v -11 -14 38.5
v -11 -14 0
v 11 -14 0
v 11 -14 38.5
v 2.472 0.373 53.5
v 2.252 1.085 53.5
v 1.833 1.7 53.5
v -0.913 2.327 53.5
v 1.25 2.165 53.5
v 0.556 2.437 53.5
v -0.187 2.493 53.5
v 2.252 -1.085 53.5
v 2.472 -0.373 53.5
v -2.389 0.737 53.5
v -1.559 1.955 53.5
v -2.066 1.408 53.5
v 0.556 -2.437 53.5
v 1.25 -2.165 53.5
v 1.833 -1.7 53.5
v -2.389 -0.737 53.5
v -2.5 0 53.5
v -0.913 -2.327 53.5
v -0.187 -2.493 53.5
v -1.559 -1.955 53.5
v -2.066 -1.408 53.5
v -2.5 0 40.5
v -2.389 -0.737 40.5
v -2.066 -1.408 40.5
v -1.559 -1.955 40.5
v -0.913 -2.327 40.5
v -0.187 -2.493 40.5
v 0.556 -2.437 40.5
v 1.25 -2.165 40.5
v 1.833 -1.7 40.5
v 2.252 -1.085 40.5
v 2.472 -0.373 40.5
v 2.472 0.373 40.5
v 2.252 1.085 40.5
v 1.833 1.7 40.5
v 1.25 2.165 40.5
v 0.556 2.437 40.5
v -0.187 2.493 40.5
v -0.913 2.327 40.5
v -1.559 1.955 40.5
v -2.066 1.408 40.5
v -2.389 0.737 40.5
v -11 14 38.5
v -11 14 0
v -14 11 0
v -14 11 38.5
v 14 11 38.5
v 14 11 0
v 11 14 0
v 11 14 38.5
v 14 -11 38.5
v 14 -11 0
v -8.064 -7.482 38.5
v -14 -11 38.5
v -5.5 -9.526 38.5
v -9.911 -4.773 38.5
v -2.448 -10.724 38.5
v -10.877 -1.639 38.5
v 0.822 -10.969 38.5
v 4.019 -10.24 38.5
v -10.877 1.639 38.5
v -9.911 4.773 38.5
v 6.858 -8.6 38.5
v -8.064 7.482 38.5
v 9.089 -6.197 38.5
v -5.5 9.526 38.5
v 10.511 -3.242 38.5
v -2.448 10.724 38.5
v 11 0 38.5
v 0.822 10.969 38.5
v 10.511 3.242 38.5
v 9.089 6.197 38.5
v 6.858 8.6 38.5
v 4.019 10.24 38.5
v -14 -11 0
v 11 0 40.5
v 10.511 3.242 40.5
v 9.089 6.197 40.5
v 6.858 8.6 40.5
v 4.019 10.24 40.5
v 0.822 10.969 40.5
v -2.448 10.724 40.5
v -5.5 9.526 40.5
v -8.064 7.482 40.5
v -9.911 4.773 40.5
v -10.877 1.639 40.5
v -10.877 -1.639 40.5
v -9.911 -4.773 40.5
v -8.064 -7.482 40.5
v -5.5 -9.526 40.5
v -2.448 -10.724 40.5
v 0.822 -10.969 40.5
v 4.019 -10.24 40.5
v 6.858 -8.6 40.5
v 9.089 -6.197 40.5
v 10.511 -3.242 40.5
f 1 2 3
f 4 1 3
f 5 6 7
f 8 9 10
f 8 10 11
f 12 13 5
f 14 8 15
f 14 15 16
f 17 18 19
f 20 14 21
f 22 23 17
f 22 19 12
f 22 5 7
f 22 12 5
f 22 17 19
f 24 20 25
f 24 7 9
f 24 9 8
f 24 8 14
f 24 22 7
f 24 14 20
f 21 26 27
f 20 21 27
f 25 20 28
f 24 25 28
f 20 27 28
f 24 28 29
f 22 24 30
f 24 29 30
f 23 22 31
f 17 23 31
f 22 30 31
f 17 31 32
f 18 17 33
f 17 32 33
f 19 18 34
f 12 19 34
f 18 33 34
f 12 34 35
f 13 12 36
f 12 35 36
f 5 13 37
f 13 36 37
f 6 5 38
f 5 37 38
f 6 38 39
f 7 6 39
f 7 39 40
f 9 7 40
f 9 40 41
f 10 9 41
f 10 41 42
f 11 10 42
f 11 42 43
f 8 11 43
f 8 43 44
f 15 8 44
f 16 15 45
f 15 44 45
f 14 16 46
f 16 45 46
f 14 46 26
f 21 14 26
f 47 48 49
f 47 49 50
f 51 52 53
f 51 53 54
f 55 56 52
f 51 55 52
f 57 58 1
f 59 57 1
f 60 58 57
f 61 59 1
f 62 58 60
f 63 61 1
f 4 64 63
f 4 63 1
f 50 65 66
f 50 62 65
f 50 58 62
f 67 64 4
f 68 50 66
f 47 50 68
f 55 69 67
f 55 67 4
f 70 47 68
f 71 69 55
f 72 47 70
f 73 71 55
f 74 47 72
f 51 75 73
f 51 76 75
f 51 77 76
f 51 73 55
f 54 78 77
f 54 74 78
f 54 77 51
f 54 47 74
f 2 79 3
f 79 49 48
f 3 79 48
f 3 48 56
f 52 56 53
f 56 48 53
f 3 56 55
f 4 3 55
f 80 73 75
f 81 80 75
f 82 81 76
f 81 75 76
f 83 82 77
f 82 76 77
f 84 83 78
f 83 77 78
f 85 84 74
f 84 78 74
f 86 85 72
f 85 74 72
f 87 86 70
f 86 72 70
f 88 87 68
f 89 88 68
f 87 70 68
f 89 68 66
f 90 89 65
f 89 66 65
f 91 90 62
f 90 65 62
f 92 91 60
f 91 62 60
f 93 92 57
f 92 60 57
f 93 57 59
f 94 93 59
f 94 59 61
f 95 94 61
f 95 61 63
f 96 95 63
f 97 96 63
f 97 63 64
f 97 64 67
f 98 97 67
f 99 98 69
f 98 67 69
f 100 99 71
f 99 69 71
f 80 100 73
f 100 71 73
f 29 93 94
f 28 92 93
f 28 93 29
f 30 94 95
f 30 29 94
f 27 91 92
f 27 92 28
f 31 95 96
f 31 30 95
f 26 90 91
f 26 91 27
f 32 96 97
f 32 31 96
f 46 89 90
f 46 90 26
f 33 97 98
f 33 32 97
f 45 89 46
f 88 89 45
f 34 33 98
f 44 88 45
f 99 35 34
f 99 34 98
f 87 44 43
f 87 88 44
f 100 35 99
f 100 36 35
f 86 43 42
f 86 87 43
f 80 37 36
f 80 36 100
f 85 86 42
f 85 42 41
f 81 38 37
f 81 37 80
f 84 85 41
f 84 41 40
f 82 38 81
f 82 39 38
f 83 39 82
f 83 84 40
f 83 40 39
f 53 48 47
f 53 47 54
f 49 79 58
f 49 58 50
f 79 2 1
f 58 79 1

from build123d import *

# Parameters (mm, degrees)
SKETCH_1_W      = 28
SKETCH_1_H      = 28
EXTRUDE_1_DEPTH = 38.5
SKETCH_2_R      = 11
EXTRUDE_2_DEPTH = 2
SKETCH_3_R      = 2.5
EXTRUDE_3_DEPTH = 13
CHAMFER_1_SIZE  = 3


with BuildPart() as part:
    # 草图1 → 凸台-拉伸1 (new body)
    with BuildSketch(Plane.XY):
        Rectangle(SKETCH_1_W, SKETCH_1_H)
    extrude(amount=EXTRUDE_1_DEPTH)

    # 草图2 → 凸台-拉伸2 (add)
    with BuildSketch(Plane.XY.offset(38.5)):
        Circle(SKETCH_2_R)
    extrude(amount=EXTRUDE_2_DEPTH)

    # 草图3 → 凸台-拉伸3 (add)
    with BuildSketch(Plane.XY.offset(40.5)):
        with Locations(Location((0, 0, 0), (0, 0, 180))):
            Circle(SKETCH_3_R)
    extrude(amount=EXTRUDE_3_DEPTH)

    # 倒角1
    chamfer_1_edges = [part.edges().sort_by_distance(p)[0] for p in [
        (14, -14, 19.25),
        (-14, -14, 19.25),
        (-14, 14, 19.25),
        (14, 14, 19.25),
    ]]
    chamfer(chamfer_1_edges, length=CHAMFER_1_SIZE)


solid = part.part
